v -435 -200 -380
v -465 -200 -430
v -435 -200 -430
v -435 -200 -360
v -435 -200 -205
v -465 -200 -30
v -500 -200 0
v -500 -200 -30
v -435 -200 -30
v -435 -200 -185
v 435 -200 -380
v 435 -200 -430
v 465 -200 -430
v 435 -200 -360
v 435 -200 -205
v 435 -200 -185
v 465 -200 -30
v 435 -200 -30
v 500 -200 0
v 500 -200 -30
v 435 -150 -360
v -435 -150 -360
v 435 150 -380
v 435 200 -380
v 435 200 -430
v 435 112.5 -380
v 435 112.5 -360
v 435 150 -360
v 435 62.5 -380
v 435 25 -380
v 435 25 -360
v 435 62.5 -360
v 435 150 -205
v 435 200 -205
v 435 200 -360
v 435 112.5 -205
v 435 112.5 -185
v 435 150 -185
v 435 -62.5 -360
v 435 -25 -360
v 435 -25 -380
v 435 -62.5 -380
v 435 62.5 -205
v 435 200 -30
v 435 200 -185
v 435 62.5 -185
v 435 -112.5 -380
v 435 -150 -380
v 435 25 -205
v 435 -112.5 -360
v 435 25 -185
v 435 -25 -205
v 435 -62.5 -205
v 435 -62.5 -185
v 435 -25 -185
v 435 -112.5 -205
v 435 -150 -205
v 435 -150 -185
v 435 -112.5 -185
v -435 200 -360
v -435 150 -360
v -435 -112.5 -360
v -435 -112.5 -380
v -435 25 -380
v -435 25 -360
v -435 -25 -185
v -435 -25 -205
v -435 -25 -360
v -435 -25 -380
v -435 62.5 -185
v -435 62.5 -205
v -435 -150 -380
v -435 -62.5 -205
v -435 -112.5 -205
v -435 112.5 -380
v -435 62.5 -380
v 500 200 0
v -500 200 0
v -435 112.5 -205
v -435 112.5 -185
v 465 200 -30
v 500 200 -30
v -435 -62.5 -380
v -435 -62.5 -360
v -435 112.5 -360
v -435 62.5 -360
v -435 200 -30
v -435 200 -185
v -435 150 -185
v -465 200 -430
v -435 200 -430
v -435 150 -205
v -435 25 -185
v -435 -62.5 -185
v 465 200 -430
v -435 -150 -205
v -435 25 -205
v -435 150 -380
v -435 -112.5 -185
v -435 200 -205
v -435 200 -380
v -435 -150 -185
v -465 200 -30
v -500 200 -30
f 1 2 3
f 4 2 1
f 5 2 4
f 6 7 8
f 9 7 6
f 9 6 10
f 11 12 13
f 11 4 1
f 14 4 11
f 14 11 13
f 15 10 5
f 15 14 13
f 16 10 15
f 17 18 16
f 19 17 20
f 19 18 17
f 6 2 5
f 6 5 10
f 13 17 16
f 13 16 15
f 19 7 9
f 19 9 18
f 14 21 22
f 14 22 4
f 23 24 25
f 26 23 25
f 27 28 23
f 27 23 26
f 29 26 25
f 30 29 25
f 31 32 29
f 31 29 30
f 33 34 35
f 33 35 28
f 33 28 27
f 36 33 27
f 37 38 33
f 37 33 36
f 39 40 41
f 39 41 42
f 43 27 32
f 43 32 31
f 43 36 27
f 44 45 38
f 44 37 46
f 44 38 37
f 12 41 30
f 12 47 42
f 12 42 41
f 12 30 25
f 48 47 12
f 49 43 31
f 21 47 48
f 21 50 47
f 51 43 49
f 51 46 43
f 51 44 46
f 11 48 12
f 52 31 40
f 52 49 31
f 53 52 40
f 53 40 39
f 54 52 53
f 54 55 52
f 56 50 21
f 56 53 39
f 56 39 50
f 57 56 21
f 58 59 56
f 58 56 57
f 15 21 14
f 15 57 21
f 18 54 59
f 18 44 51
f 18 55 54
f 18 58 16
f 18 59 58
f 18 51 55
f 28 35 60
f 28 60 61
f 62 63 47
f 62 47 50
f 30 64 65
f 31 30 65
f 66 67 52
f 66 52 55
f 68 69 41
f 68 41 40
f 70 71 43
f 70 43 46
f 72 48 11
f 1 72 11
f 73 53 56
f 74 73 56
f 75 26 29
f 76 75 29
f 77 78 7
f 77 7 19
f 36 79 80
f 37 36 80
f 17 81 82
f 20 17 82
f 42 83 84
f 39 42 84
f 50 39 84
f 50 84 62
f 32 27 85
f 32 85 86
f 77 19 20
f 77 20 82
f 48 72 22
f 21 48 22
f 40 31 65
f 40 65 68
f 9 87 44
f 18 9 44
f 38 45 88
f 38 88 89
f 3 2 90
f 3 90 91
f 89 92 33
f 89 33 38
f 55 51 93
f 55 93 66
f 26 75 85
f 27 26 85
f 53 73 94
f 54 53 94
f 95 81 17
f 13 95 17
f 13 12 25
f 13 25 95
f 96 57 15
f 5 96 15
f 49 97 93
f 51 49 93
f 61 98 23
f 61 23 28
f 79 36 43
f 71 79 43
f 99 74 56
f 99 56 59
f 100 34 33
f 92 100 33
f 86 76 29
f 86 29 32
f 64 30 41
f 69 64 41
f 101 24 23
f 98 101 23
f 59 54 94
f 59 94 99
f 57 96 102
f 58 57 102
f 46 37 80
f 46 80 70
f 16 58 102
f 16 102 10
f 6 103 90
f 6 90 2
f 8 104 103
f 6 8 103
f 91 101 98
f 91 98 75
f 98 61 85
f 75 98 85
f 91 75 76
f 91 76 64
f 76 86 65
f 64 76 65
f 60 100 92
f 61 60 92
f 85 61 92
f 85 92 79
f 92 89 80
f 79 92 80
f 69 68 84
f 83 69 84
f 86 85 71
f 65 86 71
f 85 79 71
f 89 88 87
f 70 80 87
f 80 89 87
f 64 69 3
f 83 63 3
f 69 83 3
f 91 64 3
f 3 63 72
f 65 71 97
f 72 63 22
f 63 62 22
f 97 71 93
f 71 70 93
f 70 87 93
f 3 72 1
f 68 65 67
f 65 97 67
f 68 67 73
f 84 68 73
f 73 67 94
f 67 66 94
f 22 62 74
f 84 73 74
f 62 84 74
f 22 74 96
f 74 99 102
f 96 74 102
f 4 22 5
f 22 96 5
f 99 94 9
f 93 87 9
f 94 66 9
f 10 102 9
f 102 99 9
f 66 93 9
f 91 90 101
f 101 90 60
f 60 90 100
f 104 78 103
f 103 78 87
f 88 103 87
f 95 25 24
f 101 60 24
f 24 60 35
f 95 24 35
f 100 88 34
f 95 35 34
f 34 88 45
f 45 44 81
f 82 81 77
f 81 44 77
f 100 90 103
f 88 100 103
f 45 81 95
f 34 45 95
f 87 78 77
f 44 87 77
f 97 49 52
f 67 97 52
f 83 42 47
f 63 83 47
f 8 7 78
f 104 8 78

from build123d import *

# Parameters (mm, degrees)
F0_W     = 1000
F0_H     = 400
F1_DEPTH = 30
F2_W     = 30
F2_H     = 400
F3_DEPTH = 400
F4_W     = 50
F4_H     = 20
F5_DEPTH = 870


with BuildPart() as f1:
    # F0 (on Top) → F1 (new body)
    with BuildSketch(Plane.XY):
        Rectangle(F0_W, F0_H)
    extrude(amount=-F1_DEPTH)

    # F2 (on face) → F3 (join)
    with BuildSketch(Plane(origin=(0, 0, -30), x_dir=(1, 0, 0), z_dir=(0, 0, -1))):
        with Locations((-450, 0)):
            Rectangle(F2_W, F2_H)
        with Locations((450, 0)):
            Rectangle(F2_W, F2_H)
    extrude(amount=F3_DEPTH)

    # F4 (on face) → F5 (join, through all)
    with BuildSketch(Plane(origin=(435, 0, 0), x_dir=(0, -1, 0), z_dir=(-1, 0, 0))):
        with Locations((-175, -195)):
            Rectangle(F4_W, F4_H)
        with Locations((-87.5, -195)):
            Rectangle(F4_W, F4_H)
        with Locations((0, -195)):
            Rectangle(F4_W, F4_H)
        with Locations((87.5, -195)):
            Rectangle(F4_W, F4_H)
        with Locations((175, -195)):
            Rectangle(F4_W, F4_H)
        with Locations((175, -370)):
            Rectangle(F4_W, F4_H)
        with Locations((87.5, -370)):
            Rectangle(F4_W, F4_H)
        with Locations((0, -370)):
            Rectangle(F4_W, F4_H)
        with Locations((-87.5, -370)):
            Rectangle(F4_W, F4_H)
        with Locations((-175, -370)):
            Rectangle(F4_W, F4_H)
    extrude(amount=F5_DEPTH)


solid = f1.part
